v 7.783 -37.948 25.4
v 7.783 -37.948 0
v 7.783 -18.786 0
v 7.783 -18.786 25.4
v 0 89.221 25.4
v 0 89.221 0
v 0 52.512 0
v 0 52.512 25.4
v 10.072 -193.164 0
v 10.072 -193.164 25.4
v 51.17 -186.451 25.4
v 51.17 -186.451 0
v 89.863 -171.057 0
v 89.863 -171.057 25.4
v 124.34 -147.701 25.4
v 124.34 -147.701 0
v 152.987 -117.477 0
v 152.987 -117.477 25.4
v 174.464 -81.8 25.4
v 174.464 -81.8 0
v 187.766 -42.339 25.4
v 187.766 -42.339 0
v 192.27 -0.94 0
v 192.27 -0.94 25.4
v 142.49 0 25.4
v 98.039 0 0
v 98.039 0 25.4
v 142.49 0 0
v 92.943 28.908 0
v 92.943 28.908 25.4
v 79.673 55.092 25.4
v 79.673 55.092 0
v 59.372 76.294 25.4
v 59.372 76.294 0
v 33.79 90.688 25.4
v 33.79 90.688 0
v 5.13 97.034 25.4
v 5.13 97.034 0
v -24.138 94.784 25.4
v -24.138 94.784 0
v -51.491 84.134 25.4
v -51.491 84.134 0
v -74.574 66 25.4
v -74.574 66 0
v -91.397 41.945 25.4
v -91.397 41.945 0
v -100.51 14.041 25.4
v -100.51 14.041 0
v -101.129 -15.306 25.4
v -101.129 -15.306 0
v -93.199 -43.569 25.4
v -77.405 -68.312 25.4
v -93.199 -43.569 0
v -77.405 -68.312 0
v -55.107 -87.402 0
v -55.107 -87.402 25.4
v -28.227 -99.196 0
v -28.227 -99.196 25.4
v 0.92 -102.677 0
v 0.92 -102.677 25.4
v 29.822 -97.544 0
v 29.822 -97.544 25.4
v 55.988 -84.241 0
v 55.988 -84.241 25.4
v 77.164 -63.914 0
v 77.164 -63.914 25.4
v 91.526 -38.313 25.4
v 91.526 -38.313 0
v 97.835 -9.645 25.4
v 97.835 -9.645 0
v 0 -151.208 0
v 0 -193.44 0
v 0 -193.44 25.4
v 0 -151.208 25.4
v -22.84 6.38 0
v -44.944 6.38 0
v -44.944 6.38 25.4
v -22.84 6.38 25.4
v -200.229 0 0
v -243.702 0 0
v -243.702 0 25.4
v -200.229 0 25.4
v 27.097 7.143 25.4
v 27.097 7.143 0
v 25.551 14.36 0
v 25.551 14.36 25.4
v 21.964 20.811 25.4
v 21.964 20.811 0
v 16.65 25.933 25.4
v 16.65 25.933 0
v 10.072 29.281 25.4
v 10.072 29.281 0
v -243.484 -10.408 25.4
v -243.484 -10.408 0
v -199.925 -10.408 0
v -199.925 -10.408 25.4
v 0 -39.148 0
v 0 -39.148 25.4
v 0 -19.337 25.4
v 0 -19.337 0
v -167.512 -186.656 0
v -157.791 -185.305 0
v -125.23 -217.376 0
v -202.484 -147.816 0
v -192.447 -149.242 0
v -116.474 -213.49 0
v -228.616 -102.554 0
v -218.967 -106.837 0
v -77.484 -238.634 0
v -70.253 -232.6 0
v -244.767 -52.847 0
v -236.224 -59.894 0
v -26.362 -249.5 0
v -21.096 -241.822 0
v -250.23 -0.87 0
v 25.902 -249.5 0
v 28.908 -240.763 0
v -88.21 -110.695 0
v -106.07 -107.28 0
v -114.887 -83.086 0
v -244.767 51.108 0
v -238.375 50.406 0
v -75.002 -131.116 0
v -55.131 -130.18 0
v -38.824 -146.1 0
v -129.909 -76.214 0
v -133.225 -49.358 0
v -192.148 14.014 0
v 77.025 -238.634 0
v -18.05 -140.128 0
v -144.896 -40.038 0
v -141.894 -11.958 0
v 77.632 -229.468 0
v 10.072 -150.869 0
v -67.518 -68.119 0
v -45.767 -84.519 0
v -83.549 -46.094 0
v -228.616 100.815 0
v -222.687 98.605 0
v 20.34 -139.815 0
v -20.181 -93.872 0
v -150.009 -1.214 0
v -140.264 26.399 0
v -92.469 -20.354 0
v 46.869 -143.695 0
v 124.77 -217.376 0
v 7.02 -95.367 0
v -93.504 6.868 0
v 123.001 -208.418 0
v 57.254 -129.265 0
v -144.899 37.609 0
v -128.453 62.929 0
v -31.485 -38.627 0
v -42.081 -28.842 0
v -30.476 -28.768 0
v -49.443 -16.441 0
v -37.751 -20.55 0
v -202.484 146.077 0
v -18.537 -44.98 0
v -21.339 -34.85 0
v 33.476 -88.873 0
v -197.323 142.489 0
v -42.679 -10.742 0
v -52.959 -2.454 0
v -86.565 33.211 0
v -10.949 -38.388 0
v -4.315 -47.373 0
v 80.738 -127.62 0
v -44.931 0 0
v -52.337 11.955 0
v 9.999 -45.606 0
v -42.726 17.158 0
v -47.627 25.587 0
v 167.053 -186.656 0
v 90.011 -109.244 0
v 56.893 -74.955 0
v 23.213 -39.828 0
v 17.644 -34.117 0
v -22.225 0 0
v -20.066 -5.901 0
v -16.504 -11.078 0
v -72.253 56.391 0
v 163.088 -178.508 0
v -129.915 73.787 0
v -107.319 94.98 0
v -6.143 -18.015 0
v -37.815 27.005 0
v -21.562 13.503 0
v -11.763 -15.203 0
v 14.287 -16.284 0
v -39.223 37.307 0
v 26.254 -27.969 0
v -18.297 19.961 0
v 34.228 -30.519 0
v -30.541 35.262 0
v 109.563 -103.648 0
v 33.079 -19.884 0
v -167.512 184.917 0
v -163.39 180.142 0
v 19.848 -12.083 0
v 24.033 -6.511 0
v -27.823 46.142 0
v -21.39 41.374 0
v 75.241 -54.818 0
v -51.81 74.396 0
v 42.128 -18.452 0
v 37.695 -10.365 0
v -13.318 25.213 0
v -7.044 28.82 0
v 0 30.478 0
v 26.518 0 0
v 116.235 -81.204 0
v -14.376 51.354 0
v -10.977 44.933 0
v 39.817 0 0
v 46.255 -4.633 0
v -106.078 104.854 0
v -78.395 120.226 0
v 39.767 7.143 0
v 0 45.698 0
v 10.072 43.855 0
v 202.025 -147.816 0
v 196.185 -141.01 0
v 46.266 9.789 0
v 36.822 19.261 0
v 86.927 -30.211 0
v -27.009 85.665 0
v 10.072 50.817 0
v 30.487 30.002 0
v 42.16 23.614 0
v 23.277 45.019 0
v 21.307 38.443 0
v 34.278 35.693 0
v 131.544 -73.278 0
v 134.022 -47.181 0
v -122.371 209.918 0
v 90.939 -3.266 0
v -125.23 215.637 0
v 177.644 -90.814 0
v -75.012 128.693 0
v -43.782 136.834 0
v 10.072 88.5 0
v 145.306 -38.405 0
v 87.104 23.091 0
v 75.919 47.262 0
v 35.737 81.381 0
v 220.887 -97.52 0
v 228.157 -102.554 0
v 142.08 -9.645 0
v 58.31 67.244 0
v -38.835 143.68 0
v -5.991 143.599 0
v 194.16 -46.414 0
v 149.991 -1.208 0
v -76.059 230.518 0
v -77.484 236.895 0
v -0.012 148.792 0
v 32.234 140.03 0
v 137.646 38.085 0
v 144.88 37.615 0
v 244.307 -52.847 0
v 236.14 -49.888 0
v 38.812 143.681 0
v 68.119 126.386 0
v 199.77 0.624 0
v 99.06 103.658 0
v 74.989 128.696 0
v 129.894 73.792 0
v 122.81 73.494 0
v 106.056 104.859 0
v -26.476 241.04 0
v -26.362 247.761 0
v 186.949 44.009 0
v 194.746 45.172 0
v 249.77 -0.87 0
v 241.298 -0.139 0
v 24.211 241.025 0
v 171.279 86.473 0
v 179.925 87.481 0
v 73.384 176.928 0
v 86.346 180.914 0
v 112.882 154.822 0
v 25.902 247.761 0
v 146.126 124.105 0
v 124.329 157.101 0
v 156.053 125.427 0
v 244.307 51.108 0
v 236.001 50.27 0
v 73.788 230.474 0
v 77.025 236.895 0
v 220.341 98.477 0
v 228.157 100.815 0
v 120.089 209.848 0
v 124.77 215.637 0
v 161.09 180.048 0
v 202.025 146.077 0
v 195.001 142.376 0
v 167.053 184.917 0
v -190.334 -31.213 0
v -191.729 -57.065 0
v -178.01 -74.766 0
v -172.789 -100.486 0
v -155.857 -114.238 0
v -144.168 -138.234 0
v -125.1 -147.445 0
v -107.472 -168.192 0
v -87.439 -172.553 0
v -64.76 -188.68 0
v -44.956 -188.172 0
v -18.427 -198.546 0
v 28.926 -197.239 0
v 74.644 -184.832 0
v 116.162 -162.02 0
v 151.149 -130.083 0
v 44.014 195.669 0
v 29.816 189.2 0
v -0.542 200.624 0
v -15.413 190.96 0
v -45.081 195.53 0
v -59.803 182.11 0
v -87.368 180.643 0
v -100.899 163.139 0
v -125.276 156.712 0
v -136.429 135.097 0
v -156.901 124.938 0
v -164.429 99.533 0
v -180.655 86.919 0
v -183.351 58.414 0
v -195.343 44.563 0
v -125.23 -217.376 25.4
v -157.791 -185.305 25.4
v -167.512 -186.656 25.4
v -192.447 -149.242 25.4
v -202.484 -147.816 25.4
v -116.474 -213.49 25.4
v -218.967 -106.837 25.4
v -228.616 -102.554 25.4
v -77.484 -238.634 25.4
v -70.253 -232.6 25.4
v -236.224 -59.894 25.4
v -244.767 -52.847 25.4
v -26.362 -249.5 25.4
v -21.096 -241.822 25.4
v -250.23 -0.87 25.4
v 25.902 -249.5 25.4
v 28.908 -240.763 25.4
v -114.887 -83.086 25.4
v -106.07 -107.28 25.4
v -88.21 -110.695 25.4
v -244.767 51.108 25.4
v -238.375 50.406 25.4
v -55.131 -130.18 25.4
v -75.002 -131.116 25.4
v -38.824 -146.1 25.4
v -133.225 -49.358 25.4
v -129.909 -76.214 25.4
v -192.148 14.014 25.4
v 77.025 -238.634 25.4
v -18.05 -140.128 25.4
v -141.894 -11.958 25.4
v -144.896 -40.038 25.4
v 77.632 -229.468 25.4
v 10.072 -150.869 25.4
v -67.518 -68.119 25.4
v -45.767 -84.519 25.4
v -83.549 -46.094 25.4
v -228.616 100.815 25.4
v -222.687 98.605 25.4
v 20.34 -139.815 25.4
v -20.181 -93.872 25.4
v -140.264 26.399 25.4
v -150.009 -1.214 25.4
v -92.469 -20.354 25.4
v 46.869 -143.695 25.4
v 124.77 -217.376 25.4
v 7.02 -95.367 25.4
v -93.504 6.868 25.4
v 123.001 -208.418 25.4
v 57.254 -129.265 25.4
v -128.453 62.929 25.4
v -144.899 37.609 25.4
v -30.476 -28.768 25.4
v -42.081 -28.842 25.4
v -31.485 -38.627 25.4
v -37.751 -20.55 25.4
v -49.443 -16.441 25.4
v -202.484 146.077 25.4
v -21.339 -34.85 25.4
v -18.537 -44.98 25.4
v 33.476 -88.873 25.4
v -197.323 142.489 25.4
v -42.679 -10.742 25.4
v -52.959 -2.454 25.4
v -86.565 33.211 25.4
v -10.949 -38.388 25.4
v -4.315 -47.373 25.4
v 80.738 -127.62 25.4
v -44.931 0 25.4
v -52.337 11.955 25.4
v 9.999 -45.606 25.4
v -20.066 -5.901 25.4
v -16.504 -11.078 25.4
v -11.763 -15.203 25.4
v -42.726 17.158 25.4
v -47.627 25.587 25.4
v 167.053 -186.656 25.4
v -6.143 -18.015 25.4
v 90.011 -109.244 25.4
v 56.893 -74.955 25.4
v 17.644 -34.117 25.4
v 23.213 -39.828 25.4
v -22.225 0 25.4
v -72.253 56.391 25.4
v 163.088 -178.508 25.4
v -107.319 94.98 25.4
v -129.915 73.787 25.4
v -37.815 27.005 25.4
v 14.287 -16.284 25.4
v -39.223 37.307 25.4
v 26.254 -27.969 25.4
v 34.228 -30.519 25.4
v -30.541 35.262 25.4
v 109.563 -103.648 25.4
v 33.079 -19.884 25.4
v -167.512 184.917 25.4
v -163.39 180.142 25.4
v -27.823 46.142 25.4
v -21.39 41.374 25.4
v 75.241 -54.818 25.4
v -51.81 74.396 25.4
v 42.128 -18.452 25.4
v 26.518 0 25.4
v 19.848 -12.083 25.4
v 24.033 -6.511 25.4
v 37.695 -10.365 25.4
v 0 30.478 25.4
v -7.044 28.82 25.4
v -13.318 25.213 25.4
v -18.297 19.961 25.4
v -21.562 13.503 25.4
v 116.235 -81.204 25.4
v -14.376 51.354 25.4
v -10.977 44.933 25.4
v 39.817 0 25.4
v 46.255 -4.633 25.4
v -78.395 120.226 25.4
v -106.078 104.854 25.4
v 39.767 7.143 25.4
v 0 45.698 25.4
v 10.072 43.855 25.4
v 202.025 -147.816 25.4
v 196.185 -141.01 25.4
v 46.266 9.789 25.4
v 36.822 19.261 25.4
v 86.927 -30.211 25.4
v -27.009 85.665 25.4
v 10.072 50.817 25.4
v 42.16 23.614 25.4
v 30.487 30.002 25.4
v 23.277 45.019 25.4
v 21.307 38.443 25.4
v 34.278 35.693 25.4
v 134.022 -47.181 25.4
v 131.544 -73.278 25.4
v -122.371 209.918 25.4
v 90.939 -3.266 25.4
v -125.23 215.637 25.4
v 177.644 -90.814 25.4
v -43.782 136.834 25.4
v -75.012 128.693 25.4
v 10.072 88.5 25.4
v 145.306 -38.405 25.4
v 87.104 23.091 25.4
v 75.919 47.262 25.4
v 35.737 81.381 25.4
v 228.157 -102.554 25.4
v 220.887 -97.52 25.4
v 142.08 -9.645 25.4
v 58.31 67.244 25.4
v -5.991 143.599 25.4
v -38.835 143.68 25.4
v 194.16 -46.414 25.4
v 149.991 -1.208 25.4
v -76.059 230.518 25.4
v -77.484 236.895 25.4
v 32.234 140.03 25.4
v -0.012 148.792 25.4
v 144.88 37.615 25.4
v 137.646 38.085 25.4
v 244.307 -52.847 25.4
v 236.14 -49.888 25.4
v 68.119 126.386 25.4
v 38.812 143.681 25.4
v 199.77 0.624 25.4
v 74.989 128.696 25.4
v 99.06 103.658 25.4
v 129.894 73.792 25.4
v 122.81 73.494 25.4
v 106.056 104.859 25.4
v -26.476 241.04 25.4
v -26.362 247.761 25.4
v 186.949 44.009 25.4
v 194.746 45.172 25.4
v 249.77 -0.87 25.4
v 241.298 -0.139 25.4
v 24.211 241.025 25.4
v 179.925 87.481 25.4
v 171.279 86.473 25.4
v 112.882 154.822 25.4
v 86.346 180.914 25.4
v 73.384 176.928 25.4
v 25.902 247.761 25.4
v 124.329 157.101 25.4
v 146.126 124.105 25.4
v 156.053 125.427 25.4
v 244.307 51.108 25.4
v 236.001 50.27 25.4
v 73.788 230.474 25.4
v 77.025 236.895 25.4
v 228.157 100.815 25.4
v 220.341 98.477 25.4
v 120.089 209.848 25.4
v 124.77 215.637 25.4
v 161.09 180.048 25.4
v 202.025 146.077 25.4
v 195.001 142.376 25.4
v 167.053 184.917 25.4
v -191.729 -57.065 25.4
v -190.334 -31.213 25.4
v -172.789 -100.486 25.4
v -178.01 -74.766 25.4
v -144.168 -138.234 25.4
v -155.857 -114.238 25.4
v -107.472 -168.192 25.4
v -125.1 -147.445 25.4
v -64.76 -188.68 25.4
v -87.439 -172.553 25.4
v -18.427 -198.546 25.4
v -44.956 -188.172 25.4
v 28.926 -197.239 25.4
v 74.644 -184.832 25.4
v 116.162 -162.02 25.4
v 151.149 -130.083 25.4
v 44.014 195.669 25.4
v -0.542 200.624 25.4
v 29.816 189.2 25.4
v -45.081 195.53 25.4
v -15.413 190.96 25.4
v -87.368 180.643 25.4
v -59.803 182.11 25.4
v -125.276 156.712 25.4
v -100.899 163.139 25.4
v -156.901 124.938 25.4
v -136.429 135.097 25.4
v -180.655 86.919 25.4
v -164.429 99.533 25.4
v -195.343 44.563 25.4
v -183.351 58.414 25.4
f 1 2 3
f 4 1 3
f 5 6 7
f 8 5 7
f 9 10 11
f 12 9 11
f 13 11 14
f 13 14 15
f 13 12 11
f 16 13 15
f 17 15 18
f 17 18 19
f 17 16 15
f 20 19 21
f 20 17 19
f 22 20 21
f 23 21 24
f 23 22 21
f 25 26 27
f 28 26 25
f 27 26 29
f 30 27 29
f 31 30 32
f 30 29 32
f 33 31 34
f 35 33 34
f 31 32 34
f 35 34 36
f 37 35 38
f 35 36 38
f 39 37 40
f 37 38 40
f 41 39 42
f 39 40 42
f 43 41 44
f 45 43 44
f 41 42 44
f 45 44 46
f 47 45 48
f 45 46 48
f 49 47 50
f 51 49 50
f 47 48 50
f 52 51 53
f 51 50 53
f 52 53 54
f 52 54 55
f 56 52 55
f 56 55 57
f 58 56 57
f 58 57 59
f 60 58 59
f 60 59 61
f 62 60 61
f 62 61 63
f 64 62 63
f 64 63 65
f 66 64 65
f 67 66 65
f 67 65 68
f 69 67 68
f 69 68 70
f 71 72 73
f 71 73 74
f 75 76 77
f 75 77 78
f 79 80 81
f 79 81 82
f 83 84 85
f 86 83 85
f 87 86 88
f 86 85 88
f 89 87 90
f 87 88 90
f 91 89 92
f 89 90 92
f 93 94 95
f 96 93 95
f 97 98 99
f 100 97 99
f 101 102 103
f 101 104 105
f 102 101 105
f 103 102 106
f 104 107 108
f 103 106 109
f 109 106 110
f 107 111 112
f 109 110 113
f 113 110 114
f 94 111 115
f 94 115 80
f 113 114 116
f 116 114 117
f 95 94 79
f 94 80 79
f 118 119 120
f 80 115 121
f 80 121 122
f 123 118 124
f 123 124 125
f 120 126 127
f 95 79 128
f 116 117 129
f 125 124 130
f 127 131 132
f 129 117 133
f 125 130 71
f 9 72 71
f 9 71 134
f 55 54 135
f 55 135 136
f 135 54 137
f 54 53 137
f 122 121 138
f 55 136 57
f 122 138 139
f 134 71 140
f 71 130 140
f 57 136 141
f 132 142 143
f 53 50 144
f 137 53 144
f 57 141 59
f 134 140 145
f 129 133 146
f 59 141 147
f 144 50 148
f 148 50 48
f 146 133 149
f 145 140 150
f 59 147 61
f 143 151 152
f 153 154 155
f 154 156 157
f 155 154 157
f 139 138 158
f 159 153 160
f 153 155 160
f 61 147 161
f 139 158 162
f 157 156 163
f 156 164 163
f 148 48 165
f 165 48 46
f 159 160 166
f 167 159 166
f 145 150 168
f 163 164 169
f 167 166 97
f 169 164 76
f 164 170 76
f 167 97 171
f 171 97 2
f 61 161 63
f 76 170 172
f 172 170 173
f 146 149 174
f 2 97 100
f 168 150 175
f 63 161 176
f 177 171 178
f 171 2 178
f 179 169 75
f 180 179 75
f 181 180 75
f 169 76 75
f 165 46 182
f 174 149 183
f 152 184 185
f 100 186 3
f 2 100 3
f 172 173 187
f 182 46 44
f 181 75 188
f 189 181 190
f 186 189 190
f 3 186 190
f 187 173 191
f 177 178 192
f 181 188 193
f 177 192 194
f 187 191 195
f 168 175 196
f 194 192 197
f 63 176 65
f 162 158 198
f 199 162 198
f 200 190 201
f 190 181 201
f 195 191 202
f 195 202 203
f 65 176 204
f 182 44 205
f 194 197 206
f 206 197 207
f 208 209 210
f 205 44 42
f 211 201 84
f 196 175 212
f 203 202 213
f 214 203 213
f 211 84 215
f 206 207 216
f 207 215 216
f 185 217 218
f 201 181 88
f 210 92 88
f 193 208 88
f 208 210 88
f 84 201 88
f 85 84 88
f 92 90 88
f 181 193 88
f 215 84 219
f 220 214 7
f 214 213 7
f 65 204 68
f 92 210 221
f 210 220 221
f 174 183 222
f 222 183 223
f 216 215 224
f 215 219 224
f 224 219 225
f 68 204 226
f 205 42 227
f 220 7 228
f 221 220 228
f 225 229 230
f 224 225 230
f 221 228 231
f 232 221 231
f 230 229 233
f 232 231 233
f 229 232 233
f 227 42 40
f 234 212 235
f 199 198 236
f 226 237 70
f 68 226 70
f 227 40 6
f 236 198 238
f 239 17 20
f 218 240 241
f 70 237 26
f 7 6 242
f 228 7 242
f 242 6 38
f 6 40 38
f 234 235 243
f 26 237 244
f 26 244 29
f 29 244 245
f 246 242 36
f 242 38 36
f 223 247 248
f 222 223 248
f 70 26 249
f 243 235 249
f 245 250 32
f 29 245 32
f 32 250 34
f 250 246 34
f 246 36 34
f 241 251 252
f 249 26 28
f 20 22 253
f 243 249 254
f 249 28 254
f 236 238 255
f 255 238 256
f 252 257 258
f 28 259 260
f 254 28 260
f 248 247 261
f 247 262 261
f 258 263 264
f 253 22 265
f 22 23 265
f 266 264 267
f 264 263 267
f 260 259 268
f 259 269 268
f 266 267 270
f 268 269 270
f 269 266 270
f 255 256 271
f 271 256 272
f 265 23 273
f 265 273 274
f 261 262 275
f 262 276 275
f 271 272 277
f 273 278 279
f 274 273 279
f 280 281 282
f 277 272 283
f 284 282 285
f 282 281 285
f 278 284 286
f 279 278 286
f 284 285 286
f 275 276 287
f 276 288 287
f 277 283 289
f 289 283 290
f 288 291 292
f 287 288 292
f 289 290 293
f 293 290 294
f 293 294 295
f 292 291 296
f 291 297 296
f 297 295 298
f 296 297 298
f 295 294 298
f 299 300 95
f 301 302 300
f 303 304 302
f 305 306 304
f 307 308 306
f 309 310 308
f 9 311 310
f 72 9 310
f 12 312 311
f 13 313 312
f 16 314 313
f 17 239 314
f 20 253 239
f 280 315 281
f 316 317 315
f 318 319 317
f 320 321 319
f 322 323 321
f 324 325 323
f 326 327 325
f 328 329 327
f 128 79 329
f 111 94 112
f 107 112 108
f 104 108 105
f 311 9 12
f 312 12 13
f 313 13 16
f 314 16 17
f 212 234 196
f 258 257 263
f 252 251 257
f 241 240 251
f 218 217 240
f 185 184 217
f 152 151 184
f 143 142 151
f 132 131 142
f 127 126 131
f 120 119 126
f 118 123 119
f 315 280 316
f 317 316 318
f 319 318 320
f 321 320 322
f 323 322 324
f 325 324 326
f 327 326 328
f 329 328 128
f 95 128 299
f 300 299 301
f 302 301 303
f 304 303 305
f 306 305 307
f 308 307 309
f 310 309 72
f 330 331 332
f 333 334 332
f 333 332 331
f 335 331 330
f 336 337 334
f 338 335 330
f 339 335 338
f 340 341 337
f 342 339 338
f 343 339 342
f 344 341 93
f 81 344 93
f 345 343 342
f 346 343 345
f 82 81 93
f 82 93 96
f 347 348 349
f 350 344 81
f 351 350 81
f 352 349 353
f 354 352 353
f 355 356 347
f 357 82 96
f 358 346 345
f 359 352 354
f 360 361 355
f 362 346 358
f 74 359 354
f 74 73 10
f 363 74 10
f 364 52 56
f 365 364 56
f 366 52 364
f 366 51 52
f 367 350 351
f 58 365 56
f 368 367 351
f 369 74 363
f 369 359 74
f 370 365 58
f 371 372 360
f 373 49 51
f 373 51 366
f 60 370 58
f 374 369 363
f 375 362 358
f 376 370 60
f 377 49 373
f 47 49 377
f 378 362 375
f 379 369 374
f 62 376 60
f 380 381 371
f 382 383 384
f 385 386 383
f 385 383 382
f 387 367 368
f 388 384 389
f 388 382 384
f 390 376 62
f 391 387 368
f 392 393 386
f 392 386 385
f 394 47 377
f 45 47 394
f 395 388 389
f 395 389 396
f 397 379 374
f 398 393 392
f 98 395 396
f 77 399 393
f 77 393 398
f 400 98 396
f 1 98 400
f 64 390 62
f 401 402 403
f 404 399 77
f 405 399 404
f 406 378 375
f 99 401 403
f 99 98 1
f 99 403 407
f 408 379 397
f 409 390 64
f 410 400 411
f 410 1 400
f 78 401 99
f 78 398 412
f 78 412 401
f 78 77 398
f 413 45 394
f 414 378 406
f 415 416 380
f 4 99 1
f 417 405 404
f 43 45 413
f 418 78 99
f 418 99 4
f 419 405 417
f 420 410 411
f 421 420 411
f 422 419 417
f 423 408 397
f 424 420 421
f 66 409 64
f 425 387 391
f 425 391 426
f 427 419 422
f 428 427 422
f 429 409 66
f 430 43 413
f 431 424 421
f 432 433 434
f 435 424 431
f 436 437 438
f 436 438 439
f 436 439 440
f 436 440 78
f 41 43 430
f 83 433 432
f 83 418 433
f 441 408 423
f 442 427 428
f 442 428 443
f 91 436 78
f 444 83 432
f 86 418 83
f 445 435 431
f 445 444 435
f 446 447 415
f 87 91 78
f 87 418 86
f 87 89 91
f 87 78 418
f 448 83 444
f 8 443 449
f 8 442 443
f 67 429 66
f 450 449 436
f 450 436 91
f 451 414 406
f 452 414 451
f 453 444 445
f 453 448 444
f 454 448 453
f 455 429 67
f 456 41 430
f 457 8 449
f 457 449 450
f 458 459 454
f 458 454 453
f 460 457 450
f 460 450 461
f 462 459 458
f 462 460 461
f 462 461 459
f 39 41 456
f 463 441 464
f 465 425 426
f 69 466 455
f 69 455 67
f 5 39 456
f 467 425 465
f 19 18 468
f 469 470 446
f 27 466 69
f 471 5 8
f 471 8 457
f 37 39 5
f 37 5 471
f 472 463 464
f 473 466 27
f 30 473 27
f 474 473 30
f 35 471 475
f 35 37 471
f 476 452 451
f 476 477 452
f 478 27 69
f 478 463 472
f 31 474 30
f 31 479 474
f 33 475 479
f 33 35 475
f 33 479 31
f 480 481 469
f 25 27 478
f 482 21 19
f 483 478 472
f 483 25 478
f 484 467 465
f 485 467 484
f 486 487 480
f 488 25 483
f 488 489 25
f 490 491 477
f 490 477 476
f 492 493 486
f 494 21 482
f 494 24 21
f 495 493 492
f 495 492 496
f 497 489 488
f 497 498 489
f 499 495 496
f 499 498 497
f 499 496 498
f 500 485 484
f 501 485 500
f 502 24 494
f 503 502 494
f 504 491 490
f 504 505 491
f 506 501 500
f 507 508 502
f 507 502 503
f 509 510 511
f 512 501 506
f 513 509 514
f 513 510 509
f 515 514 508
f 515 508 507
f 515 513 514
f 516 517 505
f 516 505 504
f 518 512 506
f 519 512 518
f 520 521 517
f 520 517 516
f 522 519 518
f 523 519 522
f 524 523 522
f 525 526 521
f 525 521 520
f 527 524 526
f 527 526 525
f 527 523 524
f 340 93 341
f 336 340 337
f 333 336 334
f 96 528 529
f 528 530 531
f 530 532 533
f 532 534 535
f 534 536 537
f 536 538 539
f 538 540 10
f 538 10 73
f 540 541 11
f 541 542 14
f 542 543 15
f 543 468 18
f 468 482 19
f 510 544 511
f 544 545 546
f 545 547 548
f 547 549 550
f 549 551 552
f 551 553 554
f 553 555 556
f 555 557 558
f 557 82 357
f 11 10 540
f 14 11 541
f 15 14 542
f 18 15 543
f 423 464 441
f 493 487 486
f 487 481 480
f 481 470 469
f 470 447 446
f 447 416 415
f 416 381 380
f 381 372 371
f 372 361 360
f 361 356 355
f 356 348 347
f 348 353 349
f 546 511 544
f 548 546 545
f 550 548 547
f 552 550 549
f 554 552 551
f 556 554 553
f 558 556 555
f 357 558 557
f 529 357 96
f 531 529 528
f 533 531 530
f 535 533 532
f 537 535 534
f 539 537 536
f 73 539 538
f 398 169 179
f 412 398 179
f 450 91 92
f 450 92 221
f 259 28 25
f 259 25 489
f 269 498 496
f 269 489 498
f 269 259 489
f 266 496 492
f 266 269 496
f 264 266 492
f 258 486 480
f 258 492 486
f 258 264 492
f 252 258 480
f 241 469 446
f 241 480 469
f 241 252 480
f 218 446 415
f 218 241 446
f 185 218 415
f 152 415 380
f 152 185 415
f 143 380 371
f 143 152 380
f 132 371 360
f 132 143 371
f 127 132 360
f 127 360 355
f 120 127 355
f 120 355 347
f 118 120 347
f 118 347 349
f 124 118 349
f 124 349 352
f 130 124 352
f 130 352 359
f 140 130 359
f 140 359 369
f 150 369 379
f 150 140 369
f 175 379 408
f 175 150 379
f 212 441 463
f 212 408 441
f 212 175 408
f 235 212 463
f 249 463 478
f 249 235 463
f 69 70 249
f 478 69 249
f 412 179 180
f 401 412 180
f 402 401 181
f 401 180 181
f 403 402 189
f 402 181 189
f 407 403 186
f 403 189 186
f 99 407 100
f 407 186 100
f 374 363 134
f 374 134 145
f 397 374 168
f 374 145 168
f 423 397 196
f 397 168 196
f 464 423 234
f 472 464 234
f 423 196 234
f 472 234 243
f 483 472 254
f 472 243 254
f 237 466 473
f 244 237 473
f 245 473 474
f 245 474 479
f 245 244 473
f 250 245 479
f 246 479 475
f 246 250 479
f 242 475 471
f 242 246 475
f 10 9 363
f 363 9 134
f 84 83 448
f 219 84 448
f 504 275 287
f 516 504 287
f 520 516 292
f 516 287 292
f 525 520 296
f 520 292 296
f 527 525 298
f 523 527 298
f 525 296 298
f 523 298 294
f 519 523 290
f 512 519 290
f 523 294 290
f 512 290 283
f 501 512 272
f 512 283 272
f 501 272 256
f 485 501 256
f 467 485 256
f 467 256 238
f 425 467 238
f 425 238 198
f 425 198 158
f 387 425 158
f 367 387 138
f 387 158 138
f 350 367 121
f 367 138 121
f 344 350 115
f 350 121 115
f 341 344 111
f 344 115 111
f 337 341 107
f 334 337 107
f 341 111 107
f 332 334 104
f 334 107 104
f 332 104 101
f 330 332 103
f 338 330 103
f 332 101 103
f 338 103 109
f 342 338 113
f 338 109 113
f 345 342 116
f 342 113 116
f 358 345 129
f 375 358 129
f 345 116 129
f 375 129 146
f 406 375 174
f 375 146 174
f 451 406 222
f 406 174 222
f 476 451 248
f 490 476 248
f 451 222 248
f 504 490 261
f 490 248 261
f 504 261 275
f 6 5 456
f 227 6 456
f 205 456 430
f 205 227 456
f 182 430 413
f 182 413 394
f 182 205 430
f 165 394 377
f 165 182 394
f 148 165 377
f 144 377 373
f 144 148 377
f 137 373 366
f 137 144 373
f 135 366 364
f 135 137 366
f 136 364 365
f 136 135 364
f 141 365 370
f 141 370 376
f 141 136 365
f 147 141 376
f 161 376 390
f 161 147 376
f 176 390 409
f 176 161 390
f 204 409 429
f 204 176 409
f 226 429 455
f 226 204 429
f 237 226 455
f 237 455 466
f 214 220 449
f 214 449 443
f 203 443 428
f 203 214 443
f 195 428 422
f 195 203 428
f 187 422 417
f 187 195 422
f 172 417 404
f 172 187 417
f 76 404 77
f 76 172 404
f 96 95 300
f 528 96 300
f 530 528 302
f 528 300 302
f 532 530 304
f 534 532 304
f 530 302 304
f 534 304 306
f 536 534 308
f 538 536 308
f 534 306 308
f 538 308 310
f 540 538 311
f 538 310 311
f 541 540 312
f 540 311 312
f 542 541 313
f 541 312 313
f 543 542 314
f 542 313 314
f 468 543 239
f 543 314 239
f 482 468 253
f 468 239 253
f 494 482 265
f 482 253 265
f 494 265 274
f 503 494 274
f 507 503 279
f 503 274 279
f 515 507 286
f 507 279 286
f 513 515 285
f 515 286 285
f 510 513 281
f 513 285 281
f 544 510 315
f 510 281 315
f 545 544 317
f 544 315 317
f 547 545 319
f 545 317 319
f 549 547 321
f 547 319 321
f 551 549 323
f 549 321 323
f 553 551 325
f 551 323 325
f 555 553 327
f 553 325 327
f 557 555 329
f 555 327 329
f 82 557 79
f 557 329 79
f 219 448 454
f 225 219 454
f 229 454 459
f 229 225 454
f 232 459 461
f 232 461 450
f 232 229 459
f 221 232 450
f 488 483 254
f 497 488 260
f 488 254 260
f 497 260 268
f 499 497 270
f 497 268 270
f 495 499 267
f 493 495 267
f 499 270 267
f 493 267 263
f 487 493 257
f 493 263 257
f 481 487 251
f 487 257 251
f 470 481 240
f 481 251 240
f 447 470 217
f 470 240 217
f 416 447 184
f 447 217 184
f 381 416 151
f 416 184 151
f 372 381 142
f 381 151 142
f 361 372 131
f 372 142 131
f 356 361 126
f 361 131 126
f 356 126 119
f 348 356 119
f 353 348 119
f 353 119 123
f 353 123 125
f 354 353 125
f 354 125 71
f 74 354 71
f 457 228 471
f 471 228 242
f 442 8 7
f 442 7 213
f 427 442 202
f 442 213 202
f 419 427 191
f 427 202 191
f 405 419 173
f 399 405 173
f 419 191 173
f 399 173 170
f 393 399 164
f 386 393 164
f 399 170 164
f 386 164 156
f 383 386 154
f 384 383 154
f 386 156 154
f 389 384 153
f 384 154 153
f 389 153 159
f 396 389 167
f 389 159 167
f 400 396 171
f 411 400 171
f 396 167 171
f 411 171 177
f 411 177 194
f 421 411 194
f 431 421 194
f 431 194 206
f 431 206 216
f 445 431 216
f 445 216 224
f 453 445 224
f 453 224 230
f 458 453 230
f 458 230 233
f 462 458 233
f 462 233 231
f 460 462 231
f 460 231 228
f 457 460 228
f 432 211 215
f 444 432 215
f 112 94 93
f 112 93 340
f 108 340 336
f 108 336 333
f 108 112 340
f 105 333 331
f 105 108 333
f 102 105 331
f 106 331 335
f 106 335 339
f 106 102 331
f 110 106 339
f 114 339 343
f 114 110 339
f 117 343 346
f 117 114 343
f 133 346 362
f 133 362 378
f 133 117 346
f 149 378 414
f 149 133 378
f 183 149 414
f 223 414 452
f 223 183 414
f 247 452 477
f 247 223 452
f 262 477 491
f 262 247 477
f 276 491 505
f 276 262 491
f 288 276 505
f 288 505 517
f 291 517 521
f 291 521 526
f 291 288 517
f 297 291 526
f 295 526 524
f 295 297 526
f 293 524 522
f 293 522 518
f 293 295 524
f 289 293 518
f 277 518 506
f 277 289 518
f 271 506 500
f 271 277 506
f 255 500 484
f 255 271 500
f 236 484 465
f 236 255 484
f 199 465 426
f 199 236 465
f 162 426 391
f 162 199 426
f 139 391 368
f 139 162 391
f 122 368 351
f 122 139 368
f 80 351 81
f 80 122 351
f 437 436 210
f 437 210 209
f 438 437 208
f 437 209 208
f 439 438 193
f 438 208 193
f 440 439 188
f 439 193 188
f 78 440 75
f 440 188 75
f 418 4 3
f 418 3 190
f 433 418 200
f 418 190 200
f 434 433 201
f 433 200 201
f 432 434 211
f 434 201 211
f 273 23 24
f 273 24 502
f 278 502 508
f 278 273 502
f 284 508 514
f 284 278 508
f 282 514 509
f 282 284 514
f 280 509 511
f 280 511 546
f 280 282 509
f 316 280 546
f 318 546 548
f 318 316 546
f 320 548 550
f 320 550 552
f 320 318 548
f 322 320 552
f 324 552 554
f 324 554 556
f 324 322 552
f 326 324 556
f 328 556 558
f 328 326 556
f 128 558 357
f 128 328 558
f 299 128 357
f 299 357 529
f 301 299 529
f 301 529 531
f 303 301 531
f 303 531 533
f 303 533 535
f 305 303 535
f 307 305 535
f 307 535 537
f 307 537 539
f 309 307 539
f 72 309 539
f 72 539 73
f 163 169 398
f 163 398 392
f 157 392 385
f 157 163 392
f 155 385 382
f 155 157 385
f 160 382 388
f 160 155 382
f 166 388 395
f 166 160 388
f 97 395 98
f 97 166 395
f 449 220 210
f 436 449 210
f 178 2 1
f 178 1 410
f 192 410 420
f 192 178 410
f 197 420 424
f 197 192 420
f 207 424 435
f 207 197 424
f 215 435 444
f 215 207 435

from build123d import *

# Parameters (mm, degrees)
F0_R      = 250
F0_R_2    = 242.5
F6_DEPTH  = 25.4
F1_R      = 200
F1_R_2    = 192.5
F7_DEPTH  = 25.4
F2_R      = 150
F2_R_2    = 142.5
F8_DEPTH  = 25.4
F3_R      = 100
F3_R_2    = 92.5
F9_DEPTH  = 25.4
F4_R      = 50
F4_R_2    = 42.5
F10_DEPTH = 25.4
F5_R      = 25
F11_DEPTH = 25.4
F12_W     = 53.4157007933
F12_H     = 10.408022441
F12_W_2   = 10.0719733164
F12_H_2   = 50.3633767366
F12_W_3   = 52.6525899768
F12_H_3   = 9.6449414268
F12_H_4   = 41.9694781303
F12_H_5   = 22.8924434632
F12_W_4   = 30.523262918
F12_H_6   = 6.3797682524
F12_W_5   = 17.5508763641
F12_H_7   = 7.1428497322
F12_W_6   = 7.7827312052
F12_H_8   = 28.9970943704
F13_DEPTH = 25.4


with BuildPart() as f6:
    # F0 (on Top) → F6 (new body)
    with BuildSketch(Plane.XY):
        with Locations((-0.2296342573, -0.8695026627)):
            Circle(F0_R)
        with Locations((-1.2017333358, -0.1394655317)):
            Circle(F0_R_2, mode=Mode.SUBTRACT)
    extrude(amount=F6_DEPTH)



with BuildPart() as f7:
    # F1 (on Top) → F7 (new body)
    with BuildSketch(Plane.XY):
        with Locations((-0.229648911, 0.6240262301)):
            Circle(F1_R)
        with Locations((-0.229648911, -0.9403247815)):
            Circle(F1_R_2, mode=Mode.SUBTRACT)
    extrude(amount=F7_DEPTH)


with BuildPart() as f8:
    # F2 (on Top) → F8 (new body)
    with BuildSketch(Plane.XY):
        with Locations((-0.0088901297, -1.2084672926)):
            Circle(F2_R)
        with Locations((-0.0048156621, 1.2250516324)):
            Circle(F2_R_2, mode=Mode.SUBTRACT)
    extrude(amount=F8_DEPTH)


with BuildPart() as f9:
    # F3 (on Top) → F9 (new body)
    with BuildSketch(Plane.XY):
        with Locations((-1.9242773997, -2.7173017152)):
            Circle(F3_R)
        with Locations((-1.5612963189, -3.2658300582)):
            Circle(F3_R_2, mode=Mode.SUBTRACT)
    extrude(amount=F9_DEPTH)


with BuildPart() as f10:
    # F4 (on Top) → F10 (new body)
    with BuildSketch(Plane.XY):
        with Locations((-3.2166936435, 2.6153912768)):
            Circle(F4_R)
        with Locations((-2.5570748915, 3.2750012369)):
            Circle(F4_R_2, mode=Mode.SUBTRACT)
    extrude(amount=F10_DEPTH)


with BuildPart() as f11:
    # F5 (on Top) → F11 (new body)
    with BuildSketch(Plane.XY):
        with Locations((2.1465087775, 5.5706012063)):
            Circle(F5_R)
    extrude(amount=F11_DEPTH)


with BuildPart() as f6_1:
    add(f6.part)

    add(f7.part)  # F13 merges F7

    add(f8.part)  # F13 merges F8

    add(f9.part)  # F13 merges F9

    add(f10.part)  # F13 merges F10

    add(f11.part)  # F13 merges F11
    # F12 (on face) → F13 (join)
    with BuildSketch(Plane.XY):
        with Locations((-222.6678654552, -5.2040112205)):
            Rectangle(F12_W, F12_H)
        with Locations((5.0359866582, -172.9443594813)):
            Rectangle(F12_W_2, F12_H_2)
        with Locations((121.1003102362, -4.8224707134)):
            Rectangle(F12_W_3, F12_H_3)
        with Locations((5.0359866582, 70.097066462)):
            Rectangle(F12_W_2, F12_H_4)
        with Locations((5.0359866582, 37.6661056653)):
            Rectangle(F12_W_2, F12_H_5)
        with Locations((-31.8975038826, 3.1898841262)):
            Rectangle(F12_W_4, F12_H_6)
        with Locations((34.8721230403, 3.5714248661)):
            Rectangle(F12_W_5, F12_H_7)
        with Locations((3.8913656026, -27.9588955455)):
            Rectangle(F12_W_6, F12_H_8)
    extrude(amount=F13_DEPTH)


solid = f6_1.part
